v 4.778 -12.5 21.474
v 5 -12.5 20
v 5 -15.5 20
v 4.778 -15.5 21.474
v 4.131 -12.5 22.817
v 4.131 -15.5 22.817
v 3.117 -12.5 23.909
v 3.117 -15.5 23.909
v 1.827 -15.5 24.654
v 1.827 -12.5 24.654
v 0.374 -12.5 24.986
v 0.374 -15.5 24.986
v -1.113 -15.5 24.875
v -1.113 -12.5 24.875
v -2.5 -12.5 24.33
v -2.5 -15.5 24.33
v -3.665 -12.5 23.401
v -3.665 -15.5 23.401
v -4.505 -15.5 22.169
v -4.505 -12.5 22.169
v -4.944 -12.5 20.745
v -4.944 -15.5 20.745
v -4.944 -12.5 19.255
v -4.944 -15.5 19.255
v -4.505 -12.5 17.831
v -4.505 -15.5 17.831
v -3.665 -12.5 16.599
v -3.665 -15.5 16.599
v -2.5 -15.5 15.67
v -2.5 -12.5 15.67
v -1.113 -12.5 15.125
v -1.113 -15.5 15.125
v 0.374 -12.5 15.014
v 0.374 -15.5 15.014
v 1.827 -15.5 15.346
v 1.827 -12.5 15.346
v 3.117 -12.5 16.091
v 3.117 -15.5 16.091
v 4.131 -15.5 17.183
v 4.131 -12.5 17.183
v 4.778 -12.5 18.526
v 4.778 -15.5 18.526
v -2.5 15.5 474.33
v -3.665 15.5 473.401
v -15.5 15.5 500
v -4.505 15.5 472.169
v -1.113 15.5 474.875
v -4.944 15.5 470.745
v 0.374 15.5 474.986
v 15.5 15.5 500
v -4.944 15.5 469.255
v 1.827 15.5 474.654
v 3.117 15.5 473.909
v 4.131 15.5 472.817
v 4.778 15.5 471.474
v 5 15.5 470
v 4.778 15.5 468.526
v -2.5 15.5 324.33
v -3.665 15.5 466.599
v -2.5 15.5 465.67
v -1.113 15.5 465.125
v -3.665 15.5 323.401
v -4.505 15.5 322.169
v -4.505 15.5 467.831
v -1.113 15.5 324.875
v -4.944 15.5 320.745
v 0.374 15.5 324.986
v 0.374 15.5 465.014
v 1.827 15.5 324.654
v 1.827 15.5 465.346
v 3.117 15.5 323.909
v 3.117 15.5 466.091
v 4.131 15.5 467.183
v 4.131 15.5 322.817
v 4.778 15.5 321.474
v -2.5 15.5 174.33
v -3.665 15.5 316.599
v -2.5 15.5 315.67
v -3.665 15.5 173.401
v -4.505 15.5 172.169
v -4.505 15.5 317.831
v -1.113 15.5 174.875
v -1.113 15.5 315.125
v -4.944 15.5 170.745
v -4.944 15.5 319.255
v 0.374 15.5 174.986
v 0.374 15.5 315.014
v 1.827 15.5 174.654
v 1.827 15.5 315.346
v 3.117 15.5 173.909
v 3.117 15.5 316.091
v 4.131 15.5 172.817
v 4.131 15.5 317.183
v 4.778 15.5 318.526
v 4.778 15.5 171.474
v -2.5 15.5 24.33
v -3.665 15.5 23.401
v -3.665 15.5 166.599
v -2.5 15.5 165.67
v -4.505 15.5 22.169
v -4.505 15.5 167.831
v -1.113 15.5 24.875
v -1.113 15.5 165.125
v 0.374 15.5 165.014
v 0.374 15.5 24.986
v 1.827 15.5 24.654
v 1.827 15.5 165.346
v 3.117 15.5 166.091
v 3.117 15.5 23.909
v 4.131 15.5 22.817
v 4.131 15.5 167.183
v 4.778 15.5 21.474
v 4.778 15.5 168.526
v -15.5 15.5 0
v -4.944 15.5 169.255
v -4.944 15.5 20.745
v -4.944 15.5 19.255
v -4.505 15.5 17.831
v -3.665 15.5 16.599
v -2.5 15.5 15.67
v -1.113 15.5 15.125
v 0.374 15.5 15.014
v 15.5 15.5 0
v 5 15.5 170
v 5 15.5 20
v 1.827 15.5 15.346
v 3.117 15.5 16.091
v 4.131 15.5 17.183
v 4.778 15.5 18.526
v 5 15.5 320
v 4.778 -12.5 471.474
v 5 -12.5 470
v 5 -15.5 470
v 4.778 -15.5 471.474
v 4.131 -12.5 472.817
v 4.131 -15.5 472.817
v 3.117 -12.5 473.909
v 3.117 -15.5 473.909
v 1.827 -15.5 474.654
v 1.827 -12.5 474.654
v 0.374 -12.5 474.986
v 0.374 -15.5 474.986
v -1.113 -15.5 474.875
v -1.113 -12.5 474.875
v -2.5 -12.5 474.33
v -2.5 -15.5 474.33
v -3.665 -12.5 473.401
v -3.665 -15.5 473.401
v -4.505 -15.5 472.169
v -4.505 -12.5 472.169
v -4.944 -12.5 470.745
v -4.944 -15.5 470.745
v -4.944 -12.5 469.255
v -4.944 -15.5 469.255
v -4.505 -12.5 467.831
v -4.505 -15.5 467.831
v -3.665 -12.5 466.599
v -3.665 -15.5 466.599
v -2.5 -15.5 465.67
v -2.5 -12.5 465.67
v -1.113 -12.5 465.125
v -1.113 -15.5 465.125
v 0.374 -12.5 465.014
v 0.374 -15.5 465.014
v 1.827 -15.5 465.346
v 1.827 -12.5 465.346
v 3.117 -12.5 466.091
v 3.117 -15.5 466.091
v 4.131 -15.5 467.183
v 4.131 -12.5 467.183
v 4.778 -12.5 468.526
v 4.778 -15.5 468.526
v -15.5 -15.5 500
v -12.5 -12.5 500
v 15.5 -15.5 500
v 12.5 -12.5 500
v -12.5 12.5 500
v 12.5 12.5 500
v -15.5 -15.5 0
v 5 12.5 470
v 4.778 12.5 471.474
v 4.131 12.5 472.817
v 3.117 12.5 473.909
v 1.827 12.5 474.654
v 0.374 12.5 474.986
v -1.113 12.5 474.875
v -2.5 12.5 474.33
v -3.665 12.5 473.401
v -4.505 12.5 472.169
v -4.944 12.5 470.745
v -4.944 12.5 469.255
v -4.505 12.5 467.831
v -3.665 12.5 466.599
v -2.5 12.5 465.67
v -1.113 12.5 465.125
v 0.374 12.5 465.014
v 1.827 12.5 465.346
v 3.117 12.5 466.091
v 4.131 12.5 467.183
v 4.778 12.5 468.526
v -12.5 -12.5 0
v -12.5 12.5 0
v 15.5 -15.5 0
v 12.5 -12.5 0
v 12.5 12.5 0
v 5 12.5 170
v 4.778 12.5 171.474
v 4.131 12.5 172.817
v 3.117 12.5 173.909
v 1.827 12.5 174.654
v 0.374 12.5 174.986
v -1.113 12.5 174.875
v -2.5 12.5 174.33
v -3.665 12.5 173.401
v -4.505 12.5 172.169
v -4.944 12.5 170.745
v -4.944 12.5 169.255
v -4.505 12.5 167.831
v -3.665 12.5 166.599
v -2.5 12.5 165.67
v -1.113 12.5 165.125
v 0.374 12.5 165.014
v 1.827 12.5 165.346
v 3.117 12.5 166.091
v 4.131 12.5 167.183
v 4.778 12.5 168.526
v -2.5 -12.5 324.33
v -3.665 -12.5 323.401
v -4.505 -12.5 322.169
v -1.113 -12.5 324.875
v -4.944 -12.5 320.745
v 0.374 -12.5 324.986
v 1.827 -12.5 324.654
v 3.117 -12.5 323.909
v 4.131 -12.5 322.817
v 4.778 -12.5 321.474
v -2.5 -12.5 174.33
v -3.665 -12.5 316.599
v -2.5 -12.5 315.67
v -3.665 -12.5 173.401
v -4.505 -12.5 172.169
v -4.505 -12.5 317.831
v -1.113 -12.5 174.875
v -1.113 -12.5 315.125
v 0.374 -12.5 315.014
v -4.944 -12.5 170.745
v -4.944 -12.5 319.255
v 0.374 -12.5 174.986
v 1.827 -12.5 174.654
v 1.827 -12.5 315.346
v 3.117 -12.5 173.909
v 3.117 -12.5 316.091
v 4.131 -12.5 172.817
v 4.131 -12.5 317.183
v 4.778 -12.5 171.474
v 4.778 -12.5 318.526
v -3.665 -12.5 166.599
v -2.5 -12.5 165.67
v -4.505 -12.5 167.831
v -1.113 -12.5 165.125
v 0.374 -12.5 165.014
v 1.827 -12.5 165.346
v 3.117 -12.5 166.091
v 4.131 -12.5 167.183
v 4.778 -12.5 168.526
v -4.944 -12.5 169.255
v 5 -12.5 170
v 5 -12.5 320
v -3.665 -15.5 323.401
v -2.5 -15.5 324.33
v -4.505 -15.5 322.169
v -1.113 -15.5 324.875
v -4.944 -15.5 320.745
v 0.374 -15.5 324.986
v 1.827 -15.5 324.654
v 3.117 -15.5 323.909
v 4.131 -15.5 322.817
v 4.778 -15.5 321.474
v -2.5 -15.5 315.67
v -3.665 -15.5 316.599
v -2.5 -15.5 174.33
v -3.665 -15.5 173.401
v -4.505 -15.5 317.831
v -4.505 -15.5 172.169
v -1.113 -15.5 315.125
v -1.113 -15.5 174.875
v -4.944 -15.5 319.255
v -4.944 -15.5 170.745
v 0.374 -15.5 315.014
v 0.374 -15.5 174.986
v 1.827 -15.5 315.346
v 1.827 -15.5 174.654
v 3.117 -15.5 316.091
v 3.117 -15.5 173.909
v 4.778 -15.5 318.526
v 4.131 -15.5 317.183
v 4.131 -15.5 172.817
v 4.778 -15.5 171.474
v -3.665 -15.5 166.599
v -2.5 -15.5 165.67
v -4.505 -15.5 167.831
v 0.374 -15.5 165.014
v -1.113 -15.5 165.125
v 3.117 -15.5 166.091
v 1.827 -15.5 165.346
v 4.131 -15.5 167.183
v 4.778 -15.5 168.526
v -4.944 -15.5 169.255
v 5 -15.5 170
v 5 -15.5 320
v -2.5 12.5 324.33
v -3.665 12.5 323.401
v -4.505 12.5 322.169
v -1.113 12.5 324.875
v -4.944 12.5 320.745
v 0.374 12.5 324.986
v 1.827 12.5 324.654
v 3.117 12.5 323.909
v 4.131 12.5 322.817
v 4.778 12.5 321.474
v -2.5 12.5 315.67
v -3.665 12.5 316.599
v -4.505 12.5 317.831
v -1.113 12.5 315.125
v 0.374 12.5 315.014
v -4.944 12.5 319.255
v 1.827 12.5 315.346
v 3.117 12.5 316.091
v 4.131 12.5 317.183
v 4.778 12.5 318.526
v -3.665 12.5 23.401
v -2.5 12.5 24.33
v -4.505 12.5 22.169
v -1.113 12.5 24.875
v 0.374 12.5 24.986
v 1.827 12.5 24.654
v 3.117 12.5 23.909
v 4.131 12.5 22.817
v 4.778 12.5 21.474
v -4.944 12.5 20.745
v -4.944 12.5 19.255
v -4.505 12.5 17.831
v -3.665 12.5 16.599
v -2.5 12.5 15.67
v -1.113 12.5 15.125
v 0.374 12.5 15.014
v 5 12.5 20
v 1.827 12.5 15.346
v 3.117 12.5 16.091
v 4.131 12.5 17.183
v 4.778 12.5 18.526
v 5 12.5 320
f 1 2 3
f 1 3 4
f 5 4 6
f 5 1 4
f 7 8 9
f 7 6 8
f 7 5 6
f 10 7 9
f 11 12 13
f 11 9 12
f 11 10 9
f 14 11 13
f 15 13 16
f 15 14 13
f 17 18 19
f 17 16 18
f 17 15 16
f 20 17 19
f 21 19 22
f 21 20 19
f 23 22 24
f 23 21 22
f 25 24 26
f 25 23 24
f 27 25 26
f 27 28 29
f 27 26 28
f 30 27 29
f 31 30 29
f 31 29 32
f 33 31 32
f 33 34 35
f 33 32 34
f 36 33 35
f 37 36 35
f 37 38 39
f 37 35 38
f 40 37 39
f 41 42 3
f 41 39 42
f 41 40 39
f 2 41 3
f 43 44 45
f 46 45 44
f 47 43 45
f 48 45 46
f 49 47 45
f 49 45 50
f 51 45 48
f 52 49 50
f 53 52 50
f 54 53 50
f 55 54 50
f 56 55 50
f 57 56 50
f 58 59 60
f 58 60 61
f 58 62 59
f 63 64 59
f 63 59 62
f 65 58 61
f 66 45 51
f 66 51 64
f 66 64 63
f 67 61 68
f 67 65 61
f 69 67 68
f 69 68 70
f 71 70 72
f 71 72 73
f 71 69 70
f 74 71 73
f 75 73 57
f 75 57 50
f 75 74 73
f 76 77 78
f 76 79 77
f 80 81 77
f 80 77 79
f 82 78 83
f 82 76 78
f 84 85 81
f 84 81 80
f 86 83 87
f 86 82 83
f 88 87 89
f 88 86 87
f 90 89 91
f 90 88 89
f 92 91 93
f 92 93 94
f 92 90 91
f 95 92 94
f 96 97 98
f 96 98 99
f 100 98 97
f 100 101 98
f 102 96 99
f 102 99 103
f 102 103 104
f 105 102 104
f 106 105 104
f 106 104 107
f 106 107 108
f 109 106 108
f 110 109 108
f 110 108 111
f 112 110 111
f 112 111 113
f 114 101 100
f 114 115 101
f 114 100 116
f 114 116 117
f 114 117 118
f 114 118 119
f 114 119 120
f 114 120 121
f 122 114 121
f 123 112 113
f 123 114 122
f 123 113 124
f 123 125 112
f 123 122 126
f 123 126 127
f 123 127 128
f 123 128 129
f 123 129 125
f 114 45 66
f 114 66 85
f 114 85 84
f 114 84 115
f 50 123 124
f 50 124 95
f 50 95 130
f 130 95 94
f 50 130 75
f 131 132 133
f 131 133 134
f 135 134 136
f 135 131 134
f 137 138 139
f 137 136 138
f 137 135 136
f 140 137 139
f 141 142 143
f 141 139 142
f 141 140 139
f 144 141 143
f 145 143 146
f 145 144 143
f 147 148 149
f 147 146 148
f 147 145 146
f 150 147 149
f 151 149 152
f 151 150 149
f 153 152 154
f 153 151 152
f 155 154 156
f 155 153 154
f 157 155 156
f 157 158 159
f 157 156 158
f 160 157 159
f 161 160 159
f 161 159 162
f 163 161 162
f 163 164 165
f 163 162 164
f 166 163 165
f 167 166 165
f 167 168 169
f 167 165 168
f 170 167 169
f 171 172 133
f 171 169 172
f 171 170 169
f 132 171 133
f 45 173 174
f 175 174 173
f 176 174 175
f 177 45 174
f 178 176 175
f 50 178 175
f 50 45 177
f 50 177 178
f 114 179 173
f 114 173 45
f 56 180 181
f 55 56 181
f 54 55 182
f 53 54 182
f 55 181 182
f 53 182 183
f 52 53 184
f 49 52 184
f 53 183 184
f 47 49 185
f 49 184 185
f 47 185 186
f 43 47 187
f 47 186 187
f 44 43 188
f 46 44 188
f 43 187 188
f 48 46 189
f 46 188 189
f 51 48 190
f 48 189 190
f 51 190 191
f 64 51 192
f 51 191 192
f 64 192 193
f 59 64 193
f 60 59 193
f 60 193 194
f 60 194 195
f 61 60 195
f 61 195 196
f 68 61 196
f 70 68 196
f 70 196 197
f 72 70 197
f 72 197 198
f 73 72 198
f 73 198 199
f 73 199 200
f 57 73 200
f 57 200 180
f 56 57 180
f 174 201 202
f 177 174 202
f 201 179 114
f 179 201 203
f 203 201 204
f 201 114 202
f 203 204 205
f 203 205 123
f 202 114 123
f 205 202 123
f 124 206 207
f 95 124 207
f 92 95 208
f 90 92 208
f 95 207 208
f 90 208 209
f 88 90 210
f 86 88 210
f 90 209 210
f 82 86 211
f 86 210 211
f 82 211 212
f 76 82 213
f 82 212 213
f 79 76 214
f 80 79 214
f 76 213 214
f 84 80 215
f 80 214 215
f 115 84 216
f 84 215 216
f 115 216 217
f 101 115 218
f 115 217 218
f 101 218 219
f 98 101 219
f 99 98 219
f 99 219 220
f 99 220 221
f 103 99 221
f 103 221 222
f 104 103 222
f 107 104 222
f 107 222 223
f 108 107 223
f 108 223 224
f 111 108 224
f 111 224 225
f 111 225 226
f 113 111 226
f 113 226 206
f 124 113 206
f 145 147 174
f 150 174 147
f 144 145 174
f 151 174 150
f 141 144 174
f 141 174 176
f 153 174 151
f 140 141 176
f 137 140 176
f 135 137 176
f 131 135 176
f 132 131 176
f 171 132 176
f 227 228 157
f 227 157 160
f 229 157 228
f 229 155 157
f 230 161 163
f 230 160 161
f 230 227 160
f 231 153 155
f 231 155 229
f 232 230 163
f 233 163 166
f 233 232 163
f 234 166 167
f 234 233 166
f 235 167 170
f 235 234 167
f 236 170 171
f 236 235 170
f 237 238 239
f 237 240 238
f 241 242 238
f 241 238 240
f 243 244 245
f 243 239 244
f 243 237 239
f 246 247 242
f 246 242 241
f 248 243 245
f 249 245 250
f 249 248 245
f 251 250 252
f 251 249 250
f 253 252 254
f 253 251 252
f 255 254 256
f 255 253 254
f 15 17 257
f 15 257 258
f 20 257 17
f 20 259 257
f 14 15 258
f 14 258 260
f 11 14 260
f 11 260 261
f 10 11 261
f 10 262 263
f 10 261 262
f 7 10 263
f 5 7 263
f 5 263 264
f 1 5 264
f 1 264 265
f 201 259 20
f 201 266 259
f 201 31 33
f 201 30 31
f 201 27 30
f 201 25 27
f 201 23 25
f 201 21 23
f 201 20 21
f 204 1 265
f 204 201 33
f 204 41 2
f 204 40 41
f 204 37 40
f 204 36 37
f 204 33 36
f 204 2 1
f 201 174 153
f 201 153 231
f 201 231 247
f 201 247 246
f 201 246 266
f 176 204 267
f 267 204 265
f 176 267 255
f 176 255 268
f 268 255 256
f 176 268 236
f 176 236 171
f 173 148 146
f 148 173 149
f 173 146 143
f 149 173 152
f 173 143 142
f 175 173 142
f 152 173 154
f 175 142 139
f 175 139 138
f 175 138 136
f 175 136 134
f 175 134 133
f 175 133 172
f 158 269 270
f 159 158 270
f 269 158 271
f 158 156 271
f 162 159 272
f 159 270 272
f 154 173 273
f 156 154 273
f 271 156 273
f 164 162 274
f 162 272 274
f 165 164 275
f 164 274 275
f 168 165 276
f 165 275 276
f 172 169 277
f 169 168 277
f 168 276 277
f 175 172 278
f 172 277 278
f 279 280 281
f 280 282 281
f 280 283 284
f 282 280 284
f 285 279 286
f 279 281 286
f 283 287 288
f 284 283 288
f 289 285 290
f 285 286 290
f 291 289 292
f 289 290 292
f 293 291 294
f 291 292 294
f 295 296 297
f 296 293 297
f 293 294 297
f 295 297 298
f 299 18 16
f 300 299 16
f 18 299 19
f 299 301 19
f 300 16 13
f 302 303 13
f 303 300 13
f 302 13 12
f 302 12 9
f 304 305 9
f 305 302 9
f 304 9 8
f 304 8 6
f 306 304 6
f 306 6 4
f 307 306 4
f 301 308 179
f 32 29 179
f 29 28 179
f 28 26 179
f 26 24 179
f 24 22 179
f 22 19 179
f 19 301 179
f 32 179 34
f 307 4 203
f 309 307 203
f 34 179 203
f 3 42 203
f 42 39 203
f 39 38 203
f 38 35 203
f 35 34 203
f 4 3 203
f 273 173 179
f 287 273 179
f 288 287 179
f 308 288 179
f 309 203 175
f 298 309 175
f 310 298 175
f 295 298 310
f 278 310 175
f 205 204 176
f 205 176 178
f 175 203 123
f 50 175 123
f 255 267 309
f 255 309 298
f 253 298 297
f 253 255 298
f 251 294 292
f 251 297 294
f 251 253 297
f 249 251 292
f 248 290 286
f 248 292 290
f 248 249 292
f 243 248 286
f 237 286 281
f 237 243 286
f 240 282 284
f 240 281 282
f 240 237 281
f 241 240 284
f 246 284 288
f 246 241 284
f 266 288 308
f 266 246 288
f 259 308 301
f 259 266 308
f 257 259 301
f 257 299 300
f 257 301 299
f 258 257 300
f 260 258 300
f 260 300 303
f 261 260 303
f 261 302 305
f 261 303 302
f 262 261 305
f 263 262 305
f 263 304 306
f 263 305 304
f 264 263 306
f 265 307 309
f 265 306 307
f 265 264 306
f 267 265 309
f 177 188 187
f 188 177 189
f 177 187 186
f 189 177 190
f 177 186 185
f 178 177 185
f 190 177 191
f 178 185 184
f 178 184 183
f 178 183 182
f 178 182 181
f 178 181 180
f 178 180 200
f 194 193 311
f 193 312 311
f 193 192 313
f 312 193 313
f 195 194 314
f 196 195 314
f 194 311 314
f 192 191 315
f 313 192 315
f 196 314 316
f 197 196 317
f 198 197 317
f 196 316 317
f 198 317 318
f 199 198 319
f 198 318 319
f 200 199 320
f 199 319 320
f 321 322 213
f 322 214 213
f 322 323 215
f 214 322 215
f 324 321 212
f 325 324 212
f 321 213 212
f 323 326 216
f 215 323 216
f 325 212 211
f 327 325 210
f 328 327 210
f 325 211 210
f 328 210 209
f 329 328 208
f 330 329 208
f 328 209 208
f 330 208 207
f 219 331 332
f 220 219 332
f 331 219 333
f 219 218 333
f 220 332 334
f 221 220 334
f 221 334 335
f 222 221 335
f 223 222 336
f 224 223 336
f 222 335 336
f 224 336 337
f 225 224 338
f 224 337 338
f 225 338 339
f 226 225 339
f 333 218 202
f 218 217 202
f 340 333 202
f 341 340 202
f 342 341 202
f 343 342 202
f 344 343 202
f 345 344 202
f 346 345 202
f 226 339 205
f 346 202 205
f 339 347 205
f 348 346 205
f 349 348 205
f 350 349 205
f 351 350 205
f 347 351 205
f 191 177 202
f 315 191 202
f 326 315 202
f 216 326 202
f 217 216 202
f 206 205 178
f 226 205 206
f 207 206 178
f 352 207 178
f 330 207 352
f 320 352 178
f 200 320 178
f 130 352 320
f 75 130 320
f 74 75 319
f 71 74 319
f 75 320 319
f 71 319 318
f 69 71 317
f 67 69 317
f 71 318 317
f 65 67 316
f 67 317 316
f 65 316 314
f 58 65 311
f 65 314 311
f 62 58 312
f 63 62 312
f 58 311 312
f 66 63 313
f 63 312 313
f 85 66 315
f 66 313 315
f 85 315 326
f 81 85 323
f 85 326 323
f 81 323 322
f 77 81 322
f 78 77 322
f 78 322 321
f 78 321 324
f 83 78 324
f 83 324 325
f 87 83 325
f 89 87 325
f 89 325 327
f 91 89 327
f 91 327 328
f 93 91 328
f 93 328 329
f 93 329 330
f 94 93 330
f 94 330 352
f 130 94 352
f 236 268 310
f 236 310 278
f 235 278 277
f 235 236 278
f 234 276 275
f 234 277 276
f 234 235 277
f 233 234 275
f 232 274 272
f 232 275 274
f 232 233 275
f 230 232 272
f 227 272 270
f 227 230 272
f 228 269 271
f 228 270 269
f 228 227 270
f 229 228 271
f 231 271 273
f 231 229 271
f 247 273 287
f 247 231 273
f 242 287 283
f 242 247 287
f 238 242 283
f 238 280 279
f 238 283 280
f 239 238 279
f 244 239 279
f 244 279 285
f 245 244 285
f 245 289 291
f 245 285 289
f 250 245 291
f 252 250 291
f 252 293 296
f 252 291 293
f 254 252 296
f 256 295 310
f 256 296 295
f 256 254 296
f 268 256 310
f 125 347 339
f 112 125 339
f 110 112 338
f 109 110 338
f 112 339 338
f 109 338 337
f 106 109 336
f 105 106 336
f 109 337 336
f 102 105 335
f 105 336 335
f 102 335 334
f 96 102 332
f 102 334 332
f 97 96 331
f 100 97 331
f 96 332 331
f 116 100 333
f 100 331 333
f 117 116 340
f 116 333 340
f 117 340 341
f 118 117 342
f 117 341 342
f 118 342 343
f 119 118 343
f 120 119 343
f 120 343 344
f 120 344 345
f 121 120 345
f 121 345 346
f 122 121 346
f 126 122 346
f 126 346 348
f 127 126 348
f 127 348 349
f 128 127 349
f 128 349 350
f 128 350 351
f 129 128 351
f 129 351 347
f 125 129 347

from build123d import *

# Parameters (mm, degrees)
F0_W          = 31
F0_H          = 31
F0_W_2        = 25
F0_H_2        = 25
F1_DEPTH      = 500
F2_R          = 5
F3_DEPTH      = 15.501
F3_DEPTH_BACK = 15.501


with BuildPart() as f1:
    # F0 (on Top) → F1 (new body)
    with BuildSketch(Plane.XY):
        Rectangle(F0_W, F0_H)
        Rectangle(F0_W_2, F0_H_2, mode=Mode.SUBTRACT)
    extrude(amount=F1_DEPTH)

    # F2 (on Front) → F3 (cut, two sides)
    with BuildSketch(Plane.XZ) as f3_sk:
        with Locations((0, 470)):
            Circle(F2_R)
        with Locations((0, 320)):
            Circle(F2_R)
        with Locations((0, 170)):
            Circle(F2_R)
        with Locations((0, 20)):
            Circle(F2_R)
    extrude(amount=F3_DEPTH, mode=Mode.SUBTRACT)
    extrude(f3_sk.sketch, amount=-F3_DEPTH_BACK, mode=Mode.SUBTRACT)


solid = f1.part
